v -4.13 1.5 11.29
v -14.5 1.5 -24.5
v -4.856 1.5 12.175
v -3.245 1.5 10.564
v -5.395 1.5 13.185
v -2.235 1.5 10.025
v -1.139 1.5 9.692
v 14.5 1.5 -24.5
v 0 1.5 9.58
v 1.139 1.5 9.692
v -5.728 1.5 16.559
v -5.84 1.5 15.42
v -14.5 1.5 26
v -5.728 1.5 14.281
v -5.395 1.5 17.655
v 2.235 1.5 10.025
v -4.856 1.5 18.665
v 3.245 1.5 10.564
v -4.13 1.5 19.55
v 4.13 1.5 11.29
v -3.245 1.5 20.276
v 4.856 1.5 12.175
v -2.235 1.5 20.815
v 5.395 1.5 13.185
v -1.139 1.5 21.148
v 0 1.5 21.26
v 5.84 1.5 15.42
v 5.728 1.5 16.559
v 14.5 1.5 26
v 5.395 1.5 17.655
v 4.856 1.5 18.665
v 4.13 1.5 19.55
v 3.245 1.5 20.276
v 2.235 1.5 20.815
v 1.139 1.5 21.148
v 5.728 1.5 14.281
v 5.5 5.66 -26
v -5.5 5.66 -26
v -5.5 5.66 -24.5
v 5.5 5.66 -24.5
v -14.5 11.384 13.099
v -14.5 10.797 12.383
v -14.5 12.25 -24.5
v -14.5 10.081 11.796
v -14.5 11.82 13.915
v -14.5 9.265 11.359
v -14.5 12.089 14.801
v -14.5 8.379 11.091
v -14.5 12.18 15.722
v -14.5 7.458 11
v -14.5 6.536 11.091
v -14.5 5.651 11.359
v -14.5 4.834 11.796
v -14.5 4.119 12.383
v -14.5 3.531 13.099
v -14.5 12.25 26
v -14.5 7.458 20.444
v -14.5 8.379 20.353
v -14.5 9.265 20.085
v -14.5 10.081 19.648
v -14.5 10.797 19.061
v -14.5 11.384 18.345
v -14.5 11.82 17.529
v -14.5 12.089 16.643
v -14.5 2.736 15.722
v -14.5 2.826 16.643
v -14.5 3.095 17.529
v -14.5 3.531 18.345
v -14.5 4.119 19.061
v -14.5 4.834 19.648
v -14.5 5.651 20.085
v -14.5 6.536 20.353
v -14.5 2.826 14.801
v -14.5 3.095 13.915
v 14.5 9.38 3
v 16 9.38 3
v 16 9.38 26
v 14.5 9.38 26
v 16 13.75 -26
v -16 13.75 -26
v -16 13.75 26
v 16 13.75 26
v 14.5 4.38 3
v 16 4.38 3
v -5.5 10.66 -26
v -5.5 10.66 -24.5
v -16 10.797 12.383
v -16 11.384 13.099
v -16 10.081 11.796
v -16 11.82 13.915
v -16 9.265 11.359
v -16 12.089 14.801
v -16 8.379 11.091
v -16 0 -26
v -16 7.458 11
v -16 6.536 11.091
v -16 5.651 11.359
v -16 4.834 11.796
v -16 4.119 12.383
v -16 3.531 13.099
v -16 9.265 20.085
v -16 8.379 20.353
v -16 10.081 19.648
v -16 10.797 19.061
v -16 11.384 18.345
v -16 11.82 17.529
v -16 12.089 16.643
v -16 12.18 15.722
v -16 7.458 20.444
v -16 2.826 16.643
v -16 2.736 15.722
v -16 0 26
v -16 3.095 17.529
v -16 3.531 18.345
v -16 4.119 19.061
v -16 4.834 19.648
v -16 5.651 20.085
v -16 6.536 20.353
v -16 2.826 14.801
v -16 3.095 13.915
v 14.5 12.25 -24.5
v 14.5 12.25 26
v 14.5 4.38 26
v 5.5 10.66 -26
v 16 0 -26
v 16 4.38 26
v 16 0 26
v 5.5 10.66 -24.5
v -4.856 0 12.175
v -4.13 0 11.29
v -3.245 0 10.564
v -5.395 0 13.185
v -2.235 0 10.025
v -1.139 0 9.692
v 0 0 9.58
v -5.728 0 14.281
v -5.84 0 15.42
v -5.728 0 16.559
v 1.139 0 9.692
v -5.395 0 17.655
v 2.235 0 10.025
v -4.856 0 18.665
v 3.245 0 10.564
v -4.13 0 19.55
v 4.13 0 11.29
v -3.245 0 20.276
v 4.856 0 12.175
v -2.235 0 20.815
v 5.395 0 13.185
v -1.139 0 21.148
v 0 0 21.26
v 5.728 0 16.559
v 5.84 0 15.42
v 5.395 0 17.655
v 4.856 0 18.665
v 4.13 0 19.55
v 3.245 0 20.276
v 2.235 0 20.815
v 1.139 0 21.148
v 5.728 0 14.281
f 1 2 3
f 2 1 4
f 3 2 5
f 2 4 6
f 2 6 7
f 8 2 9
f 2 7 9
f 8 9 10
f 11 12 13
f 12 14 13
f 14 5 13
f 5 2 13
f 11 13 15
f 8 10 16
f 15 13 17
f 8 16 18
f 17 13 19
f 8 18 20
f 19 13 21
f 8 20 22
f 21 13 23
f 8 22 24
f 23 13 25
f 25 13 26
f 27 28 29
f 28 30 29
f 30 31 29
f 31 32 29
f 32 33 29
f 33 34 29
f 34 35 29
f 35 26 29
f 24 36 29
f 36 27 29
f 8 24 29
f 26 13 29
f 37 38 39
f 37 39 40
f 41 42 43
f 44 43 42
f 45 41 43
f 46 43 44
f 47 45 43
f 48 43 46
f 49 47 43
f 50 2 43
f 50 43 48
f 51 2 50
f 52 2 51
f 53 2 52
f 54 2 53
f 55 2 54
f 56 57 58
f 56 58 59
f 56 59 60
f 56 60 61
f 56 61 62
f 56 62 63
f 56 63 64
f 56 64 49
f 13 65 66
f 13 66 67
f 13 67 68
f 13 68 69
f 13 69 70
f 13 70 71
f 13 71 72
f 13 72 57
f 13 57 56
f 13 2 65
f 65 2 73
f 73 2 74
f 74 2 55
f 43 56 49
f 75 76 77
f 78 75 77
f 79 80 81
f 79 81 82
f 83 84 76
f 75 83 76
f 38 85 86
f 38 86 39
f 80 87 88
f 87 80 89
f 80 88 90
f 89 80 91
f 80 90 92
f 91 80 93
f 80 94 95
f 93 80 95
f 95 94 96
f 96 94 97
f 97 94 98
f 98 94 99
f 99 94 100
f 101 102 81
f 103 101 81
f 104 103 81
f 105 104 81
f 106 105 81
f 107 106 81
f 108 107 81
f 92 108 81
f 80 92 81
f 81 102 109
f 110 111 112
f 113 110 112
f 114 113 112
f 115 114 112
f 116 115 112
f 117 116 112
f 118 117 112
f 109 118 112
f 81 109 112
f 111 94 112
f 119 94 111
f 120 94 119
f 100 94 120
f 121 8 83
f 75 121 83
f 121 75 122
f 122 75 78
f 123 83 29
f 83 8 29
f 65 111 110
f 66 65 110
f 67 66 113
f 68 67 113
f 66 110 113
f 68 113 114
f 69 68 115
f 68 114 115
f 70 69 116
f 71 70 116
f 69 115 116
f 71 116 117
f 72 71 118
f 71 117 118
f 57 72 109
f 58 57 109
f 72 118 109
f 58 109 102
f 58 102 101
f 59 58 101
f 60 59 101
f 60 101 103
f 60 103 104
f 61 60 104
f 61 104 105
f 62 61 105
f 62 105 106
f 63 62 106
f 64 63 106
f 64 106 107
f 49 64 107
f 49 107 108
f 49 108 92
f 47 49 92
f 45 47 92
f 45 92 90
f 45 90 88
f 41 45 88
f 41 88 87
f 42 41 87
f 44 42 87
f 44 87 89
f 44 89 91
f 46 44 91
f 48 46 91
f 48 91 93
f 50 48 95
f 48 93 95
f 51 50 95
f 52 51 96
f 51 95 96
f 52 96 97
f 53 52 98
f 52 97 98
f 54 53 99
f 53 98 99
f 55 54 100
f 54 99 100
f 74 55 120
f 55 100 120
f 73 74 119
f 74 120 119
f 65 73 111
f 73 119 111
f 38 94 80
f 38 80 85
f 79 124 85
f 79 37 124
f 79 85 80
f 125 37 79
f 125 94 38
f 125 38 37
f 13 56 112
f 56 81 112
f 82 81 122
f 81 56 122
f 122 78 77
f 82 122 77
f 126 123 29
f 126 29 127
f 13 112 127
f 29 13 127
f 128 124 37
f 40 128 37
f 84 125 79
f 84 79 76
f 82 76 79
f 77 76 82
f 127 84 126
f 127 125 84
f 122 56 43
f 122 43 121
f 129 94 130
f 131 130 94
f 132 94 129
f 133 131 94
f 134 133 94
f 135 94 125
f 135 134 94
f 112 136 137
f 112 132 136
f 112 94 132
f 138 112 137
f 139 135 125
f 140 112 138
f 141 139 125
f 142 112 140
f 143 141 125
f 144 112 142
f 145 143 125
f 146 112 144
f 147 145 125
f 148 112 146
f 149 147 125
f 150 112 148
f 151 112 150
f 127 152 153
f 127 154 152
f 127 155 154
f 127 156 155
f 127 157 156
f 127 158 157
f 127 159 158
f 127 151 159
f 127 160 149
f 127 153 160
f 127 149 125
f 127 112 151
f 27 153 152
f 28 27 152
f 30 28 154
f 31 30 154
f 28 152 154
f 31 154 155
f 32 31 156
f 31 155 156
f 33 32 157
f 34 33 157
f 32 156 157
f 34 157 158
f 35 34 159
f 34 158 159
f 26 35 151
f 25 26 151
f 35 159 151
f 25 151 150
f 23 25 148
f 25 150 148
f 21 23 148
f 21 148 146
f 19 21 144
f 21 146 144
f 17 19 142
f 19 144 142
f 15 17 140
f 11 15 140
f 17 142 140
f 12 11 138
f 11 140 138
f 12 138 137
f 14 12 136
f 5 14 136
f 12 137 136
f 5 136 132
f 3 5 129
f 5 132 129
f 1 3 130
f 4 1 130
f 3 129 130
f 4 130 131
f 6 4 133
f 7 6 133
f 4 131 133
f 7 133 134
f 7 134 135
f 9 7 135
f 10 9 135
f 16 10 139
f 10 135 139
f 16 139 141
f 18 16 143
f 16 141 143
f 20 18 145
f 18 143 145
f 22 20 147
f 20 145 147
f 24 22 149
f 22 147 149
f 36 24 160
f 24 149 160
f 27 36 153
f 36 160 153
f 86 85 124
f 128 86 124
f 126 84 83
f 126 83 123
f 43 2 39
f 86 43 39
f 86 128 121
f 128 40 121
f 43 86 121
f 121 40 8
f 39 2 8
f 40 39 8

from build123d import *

# Parameters (mm, degrees)
F0_W      = 32
F0_H      = 52
F1_DEPTH  = 13.75
F2_T      = -1.5
F3_R      = 5.84
F4_DEPTH  = 1.5
F5_R      = 4.722056
F6_DEPTH  = 3
F7_W      = 5
F7_H      = 23
F8_DEPTH  = 2
F9_W      = 11
F9_H      = 5
F10_DEPTH = 2


with BuildPart() as f1:
    # F0 (on Front) → F1 (new body)
    with BuildSketch(Plane.XZ):
        Rectangle(F0_W, F0_H)
    extrude(amount=-F1_DEPTH)

    # F2
    f2_openings = [f1.faces().sort_by_distance(p)[0] for p in [
        (0, 6.875, 26),
    ]]
    offset(amount=F2_T, openings=f2_openings)

    # F3 (on Front) → F4 (cut)
    with BuildSketch(Plane.XZ):
        with Locations((0, 15.42)):
            Circle(F3_R)
    extrude(amount=-F4_DEPTH, mode=Mode.SUBTRACT)

    # F5 (on face) → F6 (cut)
    with BuildSketch(Plane(origin=(-16, 0, 0), x_dir=(0, -1, 0), z_dir=(-1, 0, 0))):
        with Locations((-7.457727, 15.722008)):
            Circle(F5_R)
    extrude(amount=-F6_DEPTH, mode=Mode.SUBTRACT)

    # F7 (on face) → F8 (cut)
    with BuildSketch(Plane.YZ.offset(16)):
        with Locations((6.88, 14.5)):
            Rectangle(F7_W, F7_H)
    extrude(amount=-F8_DEPTH, mode=Mode.SUBTRACT)

    # F9 (on face) → F10 (cut)
    with BuildSketch(Plane(origin=(0, 0, -26), x_dir=(1, 0, 0), z_dir=(0, 0, -1))):
        with Locations((0, -8.16)):
            Rectangle(F9_W, F9_H)
    extrude(amount=-F10_DEPTH, mode=Mode.SUBTRACT)


solid = f1.part
